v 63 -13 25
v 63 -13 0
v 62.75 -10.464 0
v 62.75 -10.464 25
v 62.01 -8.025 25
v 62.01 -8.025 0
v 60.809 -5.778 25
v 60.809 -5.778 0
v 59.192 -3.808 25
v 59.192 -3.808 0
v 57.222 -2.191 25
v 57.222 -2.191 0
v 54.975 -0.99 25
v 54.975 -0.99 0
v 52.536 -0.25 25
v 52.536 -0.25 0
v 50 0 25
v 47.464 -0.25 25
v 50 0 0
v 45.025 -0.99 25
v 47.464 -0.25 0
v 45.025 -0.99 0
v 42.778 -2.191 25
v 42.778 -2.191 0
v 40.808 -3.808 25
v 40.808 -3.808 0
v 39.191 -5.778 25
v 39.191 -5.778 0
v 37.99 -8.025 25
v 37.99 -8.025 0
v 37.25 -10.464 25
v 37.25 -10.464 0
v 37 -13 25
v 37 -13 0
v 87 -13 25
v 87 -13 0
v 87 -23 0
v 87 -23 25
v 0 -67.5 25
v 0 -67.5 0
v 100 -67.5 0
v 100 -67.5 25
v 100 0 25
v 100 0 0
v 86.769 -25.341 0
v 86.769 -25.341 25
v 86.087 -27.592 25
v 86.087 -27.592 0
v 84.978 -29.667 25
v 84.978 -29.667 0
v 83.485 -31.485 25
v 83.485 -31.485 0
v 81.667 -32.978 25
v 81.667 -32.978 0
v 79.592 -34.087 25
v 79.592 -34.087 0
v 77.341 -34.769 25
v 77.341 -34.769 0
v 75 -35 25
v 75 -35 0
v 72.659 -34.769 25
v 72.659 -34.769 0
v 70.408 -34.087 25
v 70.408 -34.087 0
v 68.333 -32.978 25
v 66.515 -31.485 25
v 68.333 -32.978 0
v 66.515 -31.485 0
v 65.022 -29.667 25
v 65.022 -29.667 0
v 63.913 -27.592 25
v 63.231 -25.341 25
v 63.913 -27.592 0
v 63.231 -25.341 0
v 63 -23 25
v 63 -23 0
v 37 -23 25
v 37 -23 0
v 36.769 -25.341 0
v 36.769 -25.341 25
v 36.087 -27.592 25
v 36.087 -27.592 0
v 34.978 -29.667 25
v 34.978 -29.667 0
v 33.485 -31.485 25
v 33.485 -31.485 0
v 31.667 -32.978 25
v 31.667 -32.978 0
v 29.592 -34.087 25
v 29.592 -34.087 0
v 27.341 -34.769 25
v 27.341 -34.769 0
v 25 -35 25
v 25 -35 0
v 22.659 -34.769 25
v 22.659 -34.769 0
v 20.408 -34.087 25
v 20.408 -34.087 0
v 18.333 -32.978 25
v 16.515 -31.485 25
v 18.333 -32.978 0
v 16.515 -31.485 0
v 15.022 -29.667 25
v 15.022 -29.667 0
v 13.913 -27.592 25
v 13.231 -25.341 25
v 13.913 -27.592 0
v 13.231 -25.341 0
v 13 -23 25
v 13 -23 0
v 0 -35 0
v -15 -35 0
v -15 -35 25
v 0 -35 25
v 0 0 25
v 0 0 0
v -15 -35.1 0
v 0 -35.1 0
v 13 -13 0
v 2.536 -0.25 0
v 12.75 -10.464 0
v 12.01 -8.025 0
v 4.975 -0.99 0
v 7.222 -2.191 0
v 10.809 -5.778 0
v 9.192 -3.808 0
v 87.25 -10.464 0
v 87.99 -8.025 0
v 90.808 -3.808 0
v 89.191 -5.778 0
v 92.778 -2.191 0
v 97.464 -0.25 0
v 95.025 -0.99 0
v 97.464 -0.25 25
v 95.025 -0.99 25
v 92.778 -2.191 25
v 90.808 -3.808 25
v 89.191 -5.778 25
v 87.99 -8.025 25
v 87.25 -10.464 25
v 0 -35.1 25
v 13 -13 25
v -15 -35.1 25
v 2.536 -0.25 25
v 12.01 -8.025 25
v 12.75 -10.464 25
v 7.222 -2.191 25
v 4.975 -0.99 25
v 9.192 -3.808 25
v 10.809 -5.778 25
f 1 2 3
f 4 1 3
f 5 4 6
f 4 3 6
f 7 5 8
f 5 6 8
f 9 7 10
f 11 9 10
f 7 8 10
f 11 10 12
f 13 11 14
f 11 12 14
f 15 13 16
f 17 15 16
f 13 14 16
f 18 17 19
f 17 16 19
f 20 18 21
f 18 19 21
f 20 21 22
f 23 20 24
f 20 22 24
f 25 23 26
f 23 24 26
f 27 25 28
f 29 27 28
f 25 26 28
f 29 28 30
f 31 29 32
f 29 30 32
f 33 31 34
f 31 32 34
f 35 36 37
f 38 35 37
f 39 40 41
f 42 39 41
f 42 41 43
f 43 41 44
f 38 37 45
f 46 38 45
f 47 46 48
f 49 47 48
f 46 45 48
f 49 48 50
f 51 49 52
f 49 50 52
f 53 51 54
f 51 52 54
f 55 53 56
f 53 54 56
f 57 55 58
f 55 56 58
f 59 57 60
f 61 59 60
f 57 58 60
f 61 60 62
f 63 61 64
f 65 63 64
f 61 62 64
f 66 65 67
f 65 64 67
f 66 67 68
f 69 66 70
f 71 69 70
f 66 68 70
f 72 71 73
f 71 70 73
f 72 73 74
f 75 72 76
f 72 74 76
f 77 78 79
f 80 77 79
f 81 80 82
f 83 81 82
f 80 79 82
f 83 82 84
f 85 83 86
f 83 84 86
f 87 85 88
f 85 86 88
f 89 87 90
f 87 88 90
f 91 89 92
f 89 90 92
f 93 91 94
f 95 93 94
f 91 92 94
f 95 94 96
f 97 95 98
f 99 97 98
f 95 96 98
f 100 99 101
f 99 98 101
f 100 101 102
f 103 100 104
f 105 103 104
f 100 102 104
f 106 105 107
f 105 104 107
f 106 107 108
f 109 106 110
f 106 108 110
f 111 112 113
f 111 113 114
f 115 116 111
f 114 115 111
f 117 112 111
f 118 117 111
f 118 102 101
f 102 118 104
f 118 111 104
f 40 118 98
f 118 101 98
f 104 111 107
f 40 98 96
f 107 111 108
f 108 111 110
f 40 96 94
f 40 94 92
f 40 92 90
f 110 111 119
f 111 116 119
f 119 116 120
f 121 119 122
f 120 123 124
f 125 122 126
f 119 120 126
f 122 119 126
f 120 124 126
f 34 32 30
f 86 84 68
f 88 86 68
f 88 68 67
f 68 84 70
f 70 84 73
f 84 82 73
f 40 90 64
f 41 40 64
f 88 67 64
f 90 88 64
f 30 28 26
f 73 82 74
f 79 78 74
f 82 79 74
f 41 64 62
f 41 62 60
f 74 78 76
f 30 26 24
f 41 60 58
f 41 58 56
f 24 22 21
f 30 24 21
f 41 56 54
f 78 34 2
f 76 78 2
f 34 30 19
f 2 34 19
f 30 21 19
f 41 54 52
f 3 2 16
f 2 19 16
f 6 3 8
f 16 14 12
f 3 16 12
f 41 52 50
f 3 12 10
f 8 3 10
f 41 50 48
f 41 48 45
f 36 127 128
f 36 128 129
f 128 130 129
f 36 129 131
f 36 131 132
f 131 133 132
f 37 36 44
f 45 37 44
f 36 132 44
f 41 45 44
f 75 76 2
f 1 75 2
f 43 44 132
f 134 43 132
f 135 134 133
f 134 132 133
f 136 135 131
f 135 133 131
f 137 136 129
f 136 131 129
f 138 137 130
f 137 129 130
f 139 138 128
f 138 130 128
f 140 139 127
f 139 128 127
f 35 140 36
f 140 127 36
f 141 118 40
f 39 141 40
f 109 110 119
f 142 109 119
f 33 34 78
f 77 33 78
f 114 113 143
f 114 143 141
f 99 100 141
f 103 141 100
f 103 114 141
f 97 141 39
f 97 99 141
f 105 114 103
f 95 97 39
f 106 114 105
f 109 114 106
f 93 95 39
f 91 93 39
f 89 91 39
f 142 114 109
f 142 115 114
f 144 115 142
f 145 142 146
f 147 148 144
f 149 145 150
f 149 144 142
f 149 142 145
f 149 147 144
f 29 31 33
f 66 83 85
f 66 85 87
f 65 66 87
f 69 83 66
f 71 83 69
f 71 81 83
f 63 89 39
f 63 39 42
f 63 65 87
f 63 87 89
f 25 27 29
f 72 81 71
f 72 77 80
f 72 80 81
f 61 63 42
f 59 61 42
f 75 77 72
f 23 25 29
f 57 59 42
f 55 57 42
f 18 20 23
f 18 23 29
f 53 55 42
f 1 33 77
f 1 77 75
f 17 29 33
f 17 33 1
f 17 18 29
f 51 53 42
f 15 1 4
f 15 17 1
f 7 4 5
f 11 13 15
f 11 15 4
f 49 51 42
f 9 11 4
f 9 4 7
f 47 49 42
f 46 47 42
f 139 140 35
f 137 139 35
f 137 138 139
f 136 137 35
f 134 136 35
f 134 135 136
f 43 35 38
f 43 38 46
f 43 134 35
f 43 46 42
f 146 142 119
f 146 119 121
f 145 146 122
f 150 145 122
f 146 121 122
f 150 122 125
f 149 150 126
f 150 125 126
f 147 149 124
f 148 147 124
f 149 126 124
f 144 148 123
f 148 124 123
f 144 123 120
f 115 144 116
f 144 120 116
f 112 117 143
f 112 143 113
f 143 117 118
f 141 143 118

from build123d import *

# Parameters (mm, degrees)
F1_DEPTH = 25
F2_W     = 15
F2_H     = 0.1
F3_DEPTH = 25


with BuildPart() as f1:
    # F0 (on Top) → F1 (new body)
    with BuildSketch(Plane.XY):
        with BuildLine():
            ThreePointArc((13, -13), (9.192388, -3.807612), (0, 0))
            Line((0, 0), (0, -67.5))
            Line((0, -67.5), (100, -67.5))
            Line((100, -67.5), (100, 0))
            ThreePointArc((100, 0), (90.807612, -3.807612), (87, -13))
            Line((87, -13), (87, -23))
            ThreePointArc((87, -23), (75, -35), (63, -23))
            Line((63, -23), (63, -13))
            ThreePointArc((63, -13), (50, 0), (37, -13))
            Line((37, -13), (37, -23))
            ThreePointArc((37, -23), (25, -35), (13, -23))
            Line((13, -23), (13, -13))
        make_face()
    extrude(amount=F1_DEPTH)

    # F2 (on Top) → F3 (join)
    with BuildSketch(Plane.XY):
        with Locations((-7.5, -35.05)):
            Rectangle(F2_W, F2_H)
    extrude(amount=F3_DEPTH)


solid = f1.part
